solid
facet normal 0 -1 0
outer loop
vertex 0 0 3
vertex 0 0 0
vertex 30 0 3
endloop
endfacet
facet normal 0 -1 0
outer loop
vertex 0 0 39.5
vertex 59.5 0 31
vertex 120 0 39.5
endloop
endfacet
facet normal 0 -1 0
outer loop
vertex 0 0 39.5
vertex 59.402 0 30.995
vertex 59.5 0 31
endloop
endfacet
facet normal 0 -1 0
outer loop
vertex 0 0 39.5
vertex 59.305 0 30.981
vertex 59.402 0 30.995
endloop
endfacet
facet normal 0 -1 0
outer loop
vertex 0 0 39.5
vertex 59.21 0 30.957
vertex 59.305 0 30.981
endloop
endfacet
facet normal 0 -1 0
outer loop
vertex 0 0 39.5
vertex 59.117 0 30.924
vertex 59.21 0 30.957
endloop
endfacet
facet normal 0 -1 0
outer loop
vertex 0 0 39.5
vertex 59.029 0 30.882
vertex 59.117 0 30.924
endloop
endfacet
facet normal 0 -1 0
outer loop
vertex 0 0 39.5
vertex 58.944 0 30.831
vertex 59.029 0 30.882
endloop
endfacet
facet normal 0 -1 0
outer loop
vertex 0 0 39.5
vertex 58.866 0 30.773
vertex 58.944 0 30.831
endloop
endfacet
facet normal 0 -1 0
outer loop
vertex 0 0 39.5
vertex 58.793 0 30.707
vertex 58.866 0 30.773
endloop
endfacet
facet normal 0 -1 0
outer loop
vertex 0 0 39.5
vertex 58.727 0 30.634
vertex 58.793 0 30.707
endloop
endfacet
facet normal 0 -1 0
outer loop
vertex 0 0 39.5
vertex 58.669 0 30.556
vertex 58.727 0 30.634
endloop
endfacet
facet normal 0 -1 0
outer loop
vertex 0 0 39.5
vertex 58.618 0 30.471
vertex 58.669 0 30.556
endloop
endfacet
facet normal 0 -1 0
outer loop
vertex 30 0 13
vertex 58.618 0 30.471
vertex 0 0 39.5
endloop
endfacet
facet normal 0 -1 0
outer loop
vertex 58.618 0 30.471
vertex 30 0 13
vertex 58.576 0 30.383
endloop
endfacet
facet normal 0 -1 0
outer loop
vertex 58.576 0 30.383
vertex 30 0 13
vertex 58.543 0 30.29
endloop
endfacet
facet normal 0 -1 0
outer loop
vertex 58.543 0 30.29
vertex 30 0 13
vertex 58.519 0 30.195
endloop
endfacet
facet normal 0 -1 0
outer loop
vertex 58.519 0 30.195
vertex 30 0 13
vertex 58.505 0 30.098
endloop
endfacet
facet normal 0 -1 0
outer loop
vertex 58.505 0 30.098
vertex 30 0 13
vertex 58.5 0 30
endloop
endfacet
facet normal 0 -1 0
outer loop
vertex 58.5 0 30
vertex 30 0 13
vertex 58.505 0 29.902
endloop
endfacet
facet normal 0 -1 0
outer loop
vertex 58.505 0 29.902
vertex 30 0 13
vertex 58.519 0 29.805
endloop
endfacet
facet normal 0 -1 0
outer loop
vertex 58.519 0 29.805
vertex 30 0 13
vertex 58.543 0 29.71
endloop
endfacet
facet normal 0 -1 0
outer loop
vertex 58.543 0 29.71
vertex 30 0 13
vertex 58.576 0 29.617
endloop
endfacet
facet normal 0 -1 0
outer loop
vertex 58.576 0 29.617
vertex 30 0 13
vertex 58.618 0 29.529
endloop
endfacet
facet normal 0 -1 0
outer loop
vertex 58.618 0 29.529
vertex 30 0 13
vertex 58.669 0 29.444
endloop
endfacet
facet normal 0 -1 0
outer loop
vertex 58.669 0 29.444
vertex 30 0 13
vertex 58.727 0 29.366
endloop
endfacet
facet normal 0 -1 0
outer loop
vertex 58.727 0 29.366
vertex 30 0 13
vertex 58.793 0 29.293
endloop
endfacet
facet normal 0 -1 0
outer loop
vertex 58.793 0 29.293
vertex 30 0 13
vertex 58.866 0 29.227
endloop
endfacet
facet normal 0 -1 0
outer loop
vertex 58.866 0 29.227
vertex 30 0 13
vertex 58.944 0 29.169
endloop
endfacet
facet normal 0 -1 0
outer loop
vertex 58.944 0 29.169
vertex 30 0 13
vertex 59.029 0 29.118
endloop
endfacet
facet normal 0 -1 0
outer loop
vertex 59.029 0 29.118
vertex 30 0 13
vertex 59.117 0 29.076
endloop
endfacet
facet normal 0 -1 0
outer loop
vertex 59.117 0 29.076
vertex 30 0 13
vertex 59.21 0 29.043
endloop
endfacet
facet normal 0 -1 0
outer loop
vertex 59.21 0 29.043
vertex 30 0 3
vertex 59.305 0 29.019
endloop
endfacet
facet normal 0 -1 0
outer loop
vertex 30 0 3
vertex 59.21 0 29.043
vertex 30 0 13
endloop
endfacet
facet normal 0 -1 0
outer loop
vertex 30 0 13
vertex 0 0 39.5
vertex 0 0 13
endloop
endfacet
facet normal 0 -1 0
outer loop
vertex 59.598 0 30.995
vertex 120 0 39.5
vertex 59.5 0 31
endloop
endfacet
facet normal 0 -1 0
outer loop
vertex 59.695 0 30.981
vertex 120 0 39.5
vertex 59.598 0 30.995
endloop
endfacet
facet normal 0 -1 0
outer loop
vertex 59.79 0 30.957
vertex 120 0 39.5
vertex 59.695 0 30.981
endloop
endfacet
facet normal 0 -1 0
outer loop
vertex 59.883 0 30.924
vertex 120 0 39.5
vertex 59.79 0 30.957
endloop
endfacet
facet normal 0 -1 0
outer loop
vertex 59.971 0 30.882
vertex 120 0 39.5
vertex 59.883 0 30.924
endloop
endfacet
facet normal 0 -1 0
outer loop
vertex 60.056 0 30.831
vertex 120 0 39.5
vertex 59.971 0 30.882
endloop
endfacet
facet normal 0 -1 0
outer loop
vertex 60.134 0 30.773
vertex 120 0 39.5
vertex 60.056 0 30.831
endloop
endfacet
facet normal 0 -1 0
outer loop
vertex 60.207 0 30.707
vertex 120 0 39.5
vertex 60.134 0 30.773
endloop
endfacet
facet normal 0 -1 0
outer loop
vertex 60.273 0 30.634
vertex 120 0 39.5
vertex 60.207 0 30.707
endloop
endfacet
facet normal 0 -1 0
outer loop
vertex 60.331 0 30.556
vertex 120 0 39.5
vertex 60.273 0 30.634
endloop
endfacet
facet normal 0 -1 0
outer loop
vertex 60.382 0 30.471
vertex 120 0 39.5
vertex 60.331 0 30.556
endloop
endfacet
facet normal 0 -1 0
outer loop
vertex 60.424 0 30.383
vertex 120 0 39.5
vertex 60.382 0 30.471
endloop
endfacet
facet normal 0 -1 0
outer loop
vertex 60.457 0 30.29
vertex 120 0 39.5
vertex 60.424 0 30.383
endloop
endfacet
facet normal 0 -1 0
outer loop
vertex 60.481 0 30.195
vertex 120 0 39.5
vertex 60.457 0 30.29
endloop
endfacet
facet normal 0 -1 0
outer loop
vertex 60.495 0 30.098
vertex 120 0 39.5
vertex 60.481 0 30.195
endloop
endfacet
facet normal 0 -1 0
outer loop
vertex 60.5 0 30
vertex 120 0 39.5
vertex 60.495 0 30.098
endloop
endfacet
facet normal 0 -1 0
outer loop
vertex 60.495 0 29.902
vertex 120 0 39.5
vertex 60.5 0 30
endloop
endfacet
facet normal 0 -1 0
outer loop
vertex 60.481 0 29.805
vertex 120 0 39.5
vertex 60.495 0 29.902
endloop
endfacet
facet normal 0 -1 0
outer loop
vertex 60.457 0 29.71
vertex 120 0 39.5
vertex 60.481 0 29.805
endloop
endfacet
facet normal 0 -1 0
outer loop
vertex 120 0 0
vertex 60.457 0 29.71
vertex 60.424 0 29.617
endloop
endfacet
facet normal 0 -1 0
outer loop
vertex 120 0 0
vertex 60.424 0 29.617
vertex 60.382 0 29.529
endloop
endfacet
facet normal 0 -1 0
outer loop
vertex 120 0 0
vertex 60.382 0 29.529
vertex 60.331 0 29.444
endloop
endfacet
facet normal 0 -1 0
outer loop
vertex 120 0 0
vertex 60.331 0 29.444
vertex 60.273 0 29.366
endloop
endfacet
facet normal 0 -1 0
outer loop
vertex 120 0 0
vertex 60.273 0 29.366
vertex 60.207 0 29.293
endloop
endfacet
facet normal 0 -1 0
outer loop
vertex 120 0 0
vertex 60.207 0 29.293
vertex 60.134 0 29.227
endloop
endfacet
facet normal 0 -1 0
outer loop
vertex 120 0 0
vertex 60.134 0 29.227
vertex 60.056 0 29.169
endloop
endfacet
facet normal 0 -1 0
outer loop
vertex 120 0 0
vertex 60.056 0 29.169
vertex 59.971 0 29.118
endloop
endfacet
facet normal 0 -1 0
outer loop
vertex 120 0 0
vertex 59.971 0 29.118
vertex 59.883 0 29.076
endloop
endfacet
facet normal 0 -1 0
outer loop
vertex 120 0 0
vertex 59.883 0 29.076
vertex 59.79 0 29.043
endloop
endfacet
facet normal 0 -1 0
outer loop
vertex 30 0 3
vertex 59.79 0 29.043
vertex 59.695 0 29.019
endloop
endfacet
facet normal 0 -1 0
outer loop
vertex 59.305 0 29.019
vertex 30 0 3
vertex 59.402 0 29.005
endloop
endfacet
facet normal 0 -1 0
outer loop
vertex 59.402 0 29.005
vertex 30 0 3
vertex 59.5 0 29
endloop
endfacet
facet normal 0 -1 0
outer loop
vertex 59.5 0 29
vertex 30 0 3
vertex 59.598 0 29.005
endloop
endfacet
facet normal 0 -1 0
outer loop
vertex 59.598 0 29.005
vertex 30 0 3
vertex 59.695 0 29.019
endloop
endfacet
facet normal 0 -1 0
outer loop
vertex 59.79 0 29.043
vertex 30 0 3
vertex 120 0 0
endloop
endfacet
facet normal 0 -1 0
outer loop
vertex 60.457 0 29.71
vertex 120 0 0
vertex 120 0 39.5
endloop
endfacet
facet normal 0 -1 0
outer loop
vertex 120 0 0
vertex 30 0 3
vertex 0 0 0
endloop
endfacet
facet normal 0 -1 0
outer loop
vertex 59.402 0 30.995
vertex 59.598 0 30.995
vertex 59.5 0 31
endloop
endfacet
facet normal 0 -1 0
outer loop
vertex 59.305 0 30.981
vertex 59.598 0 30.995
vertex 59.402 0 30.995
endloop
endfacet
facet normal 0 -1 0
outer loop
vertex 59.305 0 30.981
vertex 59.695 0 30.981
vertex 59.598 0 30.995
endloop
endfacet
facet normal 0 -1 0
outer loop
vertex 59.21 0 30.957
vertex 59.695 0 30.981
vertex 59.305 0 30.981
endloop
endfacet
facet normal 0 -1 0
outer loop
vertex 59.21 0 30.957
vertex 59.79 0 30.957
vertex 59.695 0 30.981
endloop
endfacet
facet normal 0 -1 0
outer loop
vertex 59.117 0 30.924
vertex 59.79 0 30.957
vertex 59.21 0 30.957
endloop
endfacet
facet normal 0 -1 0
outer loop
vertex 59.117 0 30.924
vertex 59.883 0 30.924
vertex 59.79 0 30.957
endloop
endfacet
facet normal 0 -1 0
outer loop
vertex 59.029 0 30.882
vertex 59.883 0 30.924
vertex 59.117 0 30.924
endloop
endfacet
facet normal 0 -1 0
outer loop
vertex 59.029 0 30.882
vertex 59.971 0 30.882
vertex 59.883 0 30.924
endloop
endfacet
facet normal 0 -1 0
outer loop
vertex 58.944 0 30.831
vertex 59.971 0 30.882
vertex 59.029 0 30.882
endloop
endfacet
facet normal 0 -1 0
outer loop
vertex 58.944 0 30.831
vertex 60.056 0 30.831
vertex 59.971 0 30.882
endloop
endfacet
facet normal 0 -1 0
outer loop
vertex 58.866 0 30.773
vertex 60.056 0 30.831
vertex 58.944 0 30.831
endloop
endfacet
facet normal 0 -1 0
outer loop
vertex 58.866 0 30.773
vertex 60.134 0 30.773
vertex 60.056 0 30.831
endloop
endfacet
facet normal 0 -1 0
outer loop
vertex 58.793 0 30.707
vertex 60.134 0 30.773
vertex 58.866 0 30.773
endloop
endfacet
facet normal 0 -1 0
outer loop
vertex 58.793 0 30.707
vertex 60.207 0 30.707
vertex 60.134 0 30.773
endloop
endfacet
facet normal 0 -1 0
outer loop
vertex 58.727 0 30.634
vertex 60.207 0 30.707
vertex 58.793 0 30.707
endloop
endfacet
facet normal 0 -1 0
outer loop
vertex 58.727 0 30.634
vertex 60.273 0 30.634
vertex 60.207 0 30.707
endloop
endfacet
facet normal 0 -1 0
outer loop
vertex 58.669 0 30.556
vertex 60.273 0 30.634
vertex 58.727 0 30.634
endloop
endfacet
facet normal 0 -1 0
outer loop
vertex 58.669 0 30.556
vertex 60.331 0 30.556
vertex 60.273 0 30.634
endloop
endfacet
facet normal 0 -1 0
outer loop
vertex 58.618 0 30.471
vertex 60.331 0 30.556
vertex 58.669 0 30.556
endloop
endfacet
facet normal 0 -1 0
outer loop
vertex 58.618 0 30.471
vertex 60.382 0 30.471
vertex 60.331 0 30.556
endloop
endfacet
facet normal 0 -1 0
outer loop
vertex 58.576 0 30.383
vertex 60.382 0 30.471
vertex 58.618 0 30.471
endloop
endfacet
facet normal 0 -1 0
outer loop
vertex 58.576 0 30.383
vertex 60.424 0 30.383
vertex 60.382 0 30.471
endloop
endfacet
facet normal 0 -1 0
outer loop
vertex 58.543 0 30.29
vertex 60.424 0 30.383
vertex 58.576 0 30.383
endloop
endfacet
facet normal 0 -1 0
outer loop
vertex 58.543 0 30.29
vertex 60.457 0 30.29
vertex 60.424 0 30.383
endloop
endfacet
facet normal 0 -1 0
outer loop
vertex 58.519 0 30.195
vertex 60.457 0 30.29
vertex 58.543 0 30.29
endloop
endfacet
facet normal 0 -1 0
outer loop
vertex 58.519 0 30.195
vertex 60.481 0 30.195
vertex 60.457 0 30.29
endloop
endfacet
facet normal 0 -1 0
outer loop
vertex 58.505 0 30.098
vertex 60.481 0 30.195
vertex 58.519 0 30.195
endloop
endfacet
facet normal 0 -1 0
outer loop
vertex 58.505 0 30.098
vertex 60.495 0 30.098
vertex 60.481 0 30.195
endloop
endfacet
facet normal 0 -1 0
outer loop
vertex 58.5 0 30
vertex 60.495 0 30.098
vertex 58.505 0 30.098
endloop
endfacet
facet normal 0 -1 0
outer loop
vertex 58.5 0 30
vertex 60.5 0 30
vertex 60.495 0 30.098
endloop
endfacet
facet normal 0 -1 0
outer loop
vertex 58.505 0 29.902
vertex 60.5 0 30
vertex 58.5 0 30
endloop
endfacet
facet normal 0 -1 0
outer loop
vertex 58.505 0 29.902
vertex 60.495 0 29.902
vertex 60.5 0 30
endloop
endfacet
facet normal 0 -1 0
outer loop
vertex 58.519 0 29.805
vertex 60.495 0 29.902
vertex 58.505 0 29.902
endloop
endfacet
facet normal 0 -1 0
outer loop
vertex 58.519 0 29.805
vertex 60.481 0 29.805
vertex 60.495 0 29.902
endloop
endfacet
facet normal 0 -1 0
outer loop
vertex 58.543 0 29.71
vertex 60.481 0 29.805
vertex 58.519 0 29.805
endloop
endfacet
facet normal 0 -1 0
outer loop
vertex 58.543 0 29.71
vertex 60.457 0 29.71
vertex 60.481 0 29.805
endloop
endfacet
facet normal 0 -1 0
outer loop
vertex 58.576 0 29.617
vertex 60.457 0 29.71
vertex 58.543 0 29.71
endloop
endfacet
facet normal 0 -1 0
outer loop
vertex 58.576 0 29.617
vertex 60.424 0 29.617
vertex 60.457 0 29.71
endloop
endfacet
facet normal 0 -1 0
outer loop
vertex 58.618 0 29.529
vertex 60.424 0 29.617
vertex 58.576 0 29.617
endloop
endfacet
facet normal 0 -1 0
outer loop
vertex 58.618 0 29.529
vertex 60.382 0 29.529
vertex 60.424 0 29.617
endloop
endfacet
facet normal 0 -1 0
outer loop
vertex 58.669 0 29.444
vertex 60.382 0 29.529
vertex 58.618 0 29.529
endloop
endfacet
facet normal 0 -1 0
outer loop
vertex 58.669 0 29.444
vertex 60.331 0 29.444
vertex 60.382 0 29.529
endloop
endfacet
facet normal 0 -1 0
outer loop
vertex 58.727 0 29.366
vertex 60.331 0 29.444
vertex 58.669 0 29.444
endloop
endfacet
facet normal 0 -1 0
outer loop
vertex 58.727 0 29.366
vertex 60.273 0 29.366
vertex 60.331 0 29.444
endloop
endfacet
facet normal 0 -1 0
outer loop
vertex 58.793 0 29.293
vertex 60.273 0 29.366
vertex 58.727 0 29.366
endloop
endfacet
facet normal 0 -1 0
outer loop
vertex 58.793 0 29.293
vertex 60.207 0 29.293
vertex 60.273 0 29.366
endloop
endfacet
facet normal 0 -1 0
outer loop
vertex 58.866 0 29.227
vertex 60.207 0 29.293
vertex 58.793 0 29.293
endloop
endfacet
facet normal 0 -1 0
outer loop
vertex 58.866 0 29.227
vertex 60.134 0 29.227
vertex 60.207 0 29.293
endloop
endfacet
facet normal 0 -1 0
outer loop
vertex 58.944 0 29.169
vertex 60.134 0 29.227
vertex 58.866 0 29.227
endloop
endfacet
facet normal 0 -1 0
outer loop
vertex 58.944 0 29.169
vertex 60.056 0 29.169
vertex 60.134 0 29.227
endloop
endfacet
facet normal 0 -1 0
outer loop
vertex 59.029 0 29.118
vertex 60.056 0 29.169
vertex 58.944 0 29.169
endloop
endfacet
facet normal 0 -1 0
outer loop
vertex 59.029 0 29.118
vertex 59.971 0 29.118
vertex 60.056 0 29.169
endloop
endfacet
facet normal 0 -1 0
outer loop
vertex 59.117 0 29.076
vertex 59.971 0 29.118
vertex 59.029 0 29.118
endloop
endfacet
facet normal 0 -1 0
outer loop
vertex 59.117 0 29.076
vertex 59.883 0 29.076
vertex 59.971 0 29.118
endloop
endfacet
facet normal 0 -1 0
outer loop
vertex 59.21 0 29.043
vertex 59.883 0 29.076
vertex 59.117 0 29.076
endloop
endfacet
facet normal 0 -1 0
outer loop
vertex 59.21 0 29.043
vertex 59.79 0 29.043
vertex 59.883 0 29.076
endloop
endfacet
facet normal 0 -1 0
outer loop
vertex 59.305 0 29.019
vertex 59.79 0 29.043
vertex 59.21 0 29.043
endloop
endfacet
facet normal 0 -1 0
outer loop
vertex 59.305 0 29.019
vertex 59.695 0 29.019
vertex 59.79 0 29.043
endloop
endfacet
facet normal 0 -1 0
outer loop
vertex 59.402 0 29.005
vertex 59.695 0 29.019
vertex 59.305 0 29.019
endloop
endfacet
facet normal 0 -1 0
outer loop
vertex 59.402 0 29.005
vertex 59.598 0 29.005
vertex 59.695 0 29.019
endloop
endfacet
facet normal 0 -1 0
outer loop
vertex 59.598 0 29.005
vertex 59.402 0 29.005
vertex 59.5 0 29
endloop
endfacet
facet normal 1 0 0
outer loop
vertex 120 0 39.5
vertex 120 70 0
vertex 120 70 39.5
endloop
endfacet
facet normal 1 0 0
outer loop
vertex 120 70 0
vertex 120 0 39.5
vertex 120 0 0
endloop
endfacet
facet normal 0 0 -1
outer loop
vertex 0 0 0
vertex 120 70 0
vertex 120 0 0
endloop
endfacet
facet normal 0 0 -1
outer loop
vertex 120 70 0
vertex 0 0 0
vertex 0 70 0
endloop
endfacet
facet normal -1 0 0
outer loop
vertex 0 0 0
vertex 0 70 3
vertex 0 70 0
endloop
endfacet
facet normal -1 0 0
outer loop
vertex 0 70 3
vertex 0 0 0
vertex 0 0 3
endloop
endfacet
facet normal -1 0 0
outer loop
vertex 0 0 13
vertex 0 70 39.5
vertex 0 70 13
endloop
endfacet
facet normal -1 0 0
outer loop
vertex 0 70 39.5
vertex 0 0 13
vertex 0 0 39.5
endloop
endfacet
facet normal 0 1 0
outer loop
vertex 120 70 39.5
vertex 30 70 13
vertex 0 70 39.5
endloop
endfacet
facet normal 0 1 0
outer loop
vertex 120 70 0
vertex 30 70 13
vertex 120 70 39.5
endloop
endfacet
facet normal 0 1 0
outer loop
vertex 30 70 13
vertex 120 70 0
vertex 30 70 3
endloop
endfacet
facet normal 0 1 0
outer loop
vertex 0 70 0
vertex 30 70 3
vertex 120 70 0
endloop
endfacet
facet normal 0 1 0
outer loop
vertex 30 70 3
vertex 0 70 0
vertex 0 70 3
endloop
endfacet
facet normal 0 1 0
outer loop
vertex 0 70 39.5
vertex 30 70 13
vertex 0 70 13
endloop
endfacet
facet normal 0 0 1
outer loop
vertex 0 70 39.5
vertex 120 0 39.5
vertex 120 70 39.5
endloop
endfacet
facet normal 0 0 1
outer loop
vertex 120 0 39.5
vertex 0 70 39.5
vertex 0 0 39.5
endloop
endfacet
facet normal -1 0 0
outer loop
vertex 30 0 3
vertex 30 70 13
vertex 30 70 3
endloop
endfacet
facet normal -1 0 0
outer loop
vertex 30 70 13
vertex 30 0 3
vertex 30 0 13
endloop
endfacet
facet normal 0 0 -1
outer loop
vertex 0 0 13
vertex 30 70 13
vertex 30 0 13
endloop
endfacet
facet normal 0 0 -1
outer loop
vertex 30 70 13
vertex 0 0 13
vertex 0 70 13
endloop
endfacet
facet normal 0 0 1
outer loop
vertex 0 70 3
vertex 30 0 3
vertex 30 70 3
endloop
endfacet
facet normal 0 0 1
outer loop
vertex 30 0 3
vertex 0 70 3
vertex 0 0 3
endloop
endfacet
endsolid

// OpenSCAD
// Mini horizontal gel-electrophoresis box - buffer tank
// Print orientation: base on XY plane, open top facing +Z

// ---------- Parameters ----------
outer_x      = 120;   // outer length in X
outer_y      = 70;    // outer width in Y
outer_z      = 40;    // overall height in Z
wall         = 3;     // wall thickness
floor        = 3;     // floor thickness (bottom slab)

platform_x   = 60;    // platform length in X (centred)
platform_y   = 70;    // platform width in Y (full inner width)
platform_top = 13;    // top of platform above outer base

hole_d       = 2;     // electrode wire hole diameter
hole_y       = 0;     // hole centre Y
hole_z       = 30;    // hole centre Z

eps          = 0.5;   // cutter overshoot

$fn = 64;

// ---------- Derived ----------
inner_h = outer_z - floor;               // 37 mm deep
// platform_top = inner_h - wall; would be 37-3=34, but given as 13 (lowered floor)

// ---------- Model ----------
difference() {
    // Tank body
    cube([outer_x, outer_y, outer_z]);

    // Open top
    translate([0, 0, outer_z - eps])
        cube([outer_x, outer_y, eps]);

    // Raised platform
    translate([-platform_x/2, 0, floor])
        cube([platform_x, platform_y, platform_top - floor]);

    // Electrode holes through end walls, along X
    for (sx = [-1, 1])
        translate([sx * (outer_x/2 - eps), hole_y, hole_z])
            rotate([90, 0, 0])
                cylinder(d = hole_d, h = outer_x + 2*eps);
}
